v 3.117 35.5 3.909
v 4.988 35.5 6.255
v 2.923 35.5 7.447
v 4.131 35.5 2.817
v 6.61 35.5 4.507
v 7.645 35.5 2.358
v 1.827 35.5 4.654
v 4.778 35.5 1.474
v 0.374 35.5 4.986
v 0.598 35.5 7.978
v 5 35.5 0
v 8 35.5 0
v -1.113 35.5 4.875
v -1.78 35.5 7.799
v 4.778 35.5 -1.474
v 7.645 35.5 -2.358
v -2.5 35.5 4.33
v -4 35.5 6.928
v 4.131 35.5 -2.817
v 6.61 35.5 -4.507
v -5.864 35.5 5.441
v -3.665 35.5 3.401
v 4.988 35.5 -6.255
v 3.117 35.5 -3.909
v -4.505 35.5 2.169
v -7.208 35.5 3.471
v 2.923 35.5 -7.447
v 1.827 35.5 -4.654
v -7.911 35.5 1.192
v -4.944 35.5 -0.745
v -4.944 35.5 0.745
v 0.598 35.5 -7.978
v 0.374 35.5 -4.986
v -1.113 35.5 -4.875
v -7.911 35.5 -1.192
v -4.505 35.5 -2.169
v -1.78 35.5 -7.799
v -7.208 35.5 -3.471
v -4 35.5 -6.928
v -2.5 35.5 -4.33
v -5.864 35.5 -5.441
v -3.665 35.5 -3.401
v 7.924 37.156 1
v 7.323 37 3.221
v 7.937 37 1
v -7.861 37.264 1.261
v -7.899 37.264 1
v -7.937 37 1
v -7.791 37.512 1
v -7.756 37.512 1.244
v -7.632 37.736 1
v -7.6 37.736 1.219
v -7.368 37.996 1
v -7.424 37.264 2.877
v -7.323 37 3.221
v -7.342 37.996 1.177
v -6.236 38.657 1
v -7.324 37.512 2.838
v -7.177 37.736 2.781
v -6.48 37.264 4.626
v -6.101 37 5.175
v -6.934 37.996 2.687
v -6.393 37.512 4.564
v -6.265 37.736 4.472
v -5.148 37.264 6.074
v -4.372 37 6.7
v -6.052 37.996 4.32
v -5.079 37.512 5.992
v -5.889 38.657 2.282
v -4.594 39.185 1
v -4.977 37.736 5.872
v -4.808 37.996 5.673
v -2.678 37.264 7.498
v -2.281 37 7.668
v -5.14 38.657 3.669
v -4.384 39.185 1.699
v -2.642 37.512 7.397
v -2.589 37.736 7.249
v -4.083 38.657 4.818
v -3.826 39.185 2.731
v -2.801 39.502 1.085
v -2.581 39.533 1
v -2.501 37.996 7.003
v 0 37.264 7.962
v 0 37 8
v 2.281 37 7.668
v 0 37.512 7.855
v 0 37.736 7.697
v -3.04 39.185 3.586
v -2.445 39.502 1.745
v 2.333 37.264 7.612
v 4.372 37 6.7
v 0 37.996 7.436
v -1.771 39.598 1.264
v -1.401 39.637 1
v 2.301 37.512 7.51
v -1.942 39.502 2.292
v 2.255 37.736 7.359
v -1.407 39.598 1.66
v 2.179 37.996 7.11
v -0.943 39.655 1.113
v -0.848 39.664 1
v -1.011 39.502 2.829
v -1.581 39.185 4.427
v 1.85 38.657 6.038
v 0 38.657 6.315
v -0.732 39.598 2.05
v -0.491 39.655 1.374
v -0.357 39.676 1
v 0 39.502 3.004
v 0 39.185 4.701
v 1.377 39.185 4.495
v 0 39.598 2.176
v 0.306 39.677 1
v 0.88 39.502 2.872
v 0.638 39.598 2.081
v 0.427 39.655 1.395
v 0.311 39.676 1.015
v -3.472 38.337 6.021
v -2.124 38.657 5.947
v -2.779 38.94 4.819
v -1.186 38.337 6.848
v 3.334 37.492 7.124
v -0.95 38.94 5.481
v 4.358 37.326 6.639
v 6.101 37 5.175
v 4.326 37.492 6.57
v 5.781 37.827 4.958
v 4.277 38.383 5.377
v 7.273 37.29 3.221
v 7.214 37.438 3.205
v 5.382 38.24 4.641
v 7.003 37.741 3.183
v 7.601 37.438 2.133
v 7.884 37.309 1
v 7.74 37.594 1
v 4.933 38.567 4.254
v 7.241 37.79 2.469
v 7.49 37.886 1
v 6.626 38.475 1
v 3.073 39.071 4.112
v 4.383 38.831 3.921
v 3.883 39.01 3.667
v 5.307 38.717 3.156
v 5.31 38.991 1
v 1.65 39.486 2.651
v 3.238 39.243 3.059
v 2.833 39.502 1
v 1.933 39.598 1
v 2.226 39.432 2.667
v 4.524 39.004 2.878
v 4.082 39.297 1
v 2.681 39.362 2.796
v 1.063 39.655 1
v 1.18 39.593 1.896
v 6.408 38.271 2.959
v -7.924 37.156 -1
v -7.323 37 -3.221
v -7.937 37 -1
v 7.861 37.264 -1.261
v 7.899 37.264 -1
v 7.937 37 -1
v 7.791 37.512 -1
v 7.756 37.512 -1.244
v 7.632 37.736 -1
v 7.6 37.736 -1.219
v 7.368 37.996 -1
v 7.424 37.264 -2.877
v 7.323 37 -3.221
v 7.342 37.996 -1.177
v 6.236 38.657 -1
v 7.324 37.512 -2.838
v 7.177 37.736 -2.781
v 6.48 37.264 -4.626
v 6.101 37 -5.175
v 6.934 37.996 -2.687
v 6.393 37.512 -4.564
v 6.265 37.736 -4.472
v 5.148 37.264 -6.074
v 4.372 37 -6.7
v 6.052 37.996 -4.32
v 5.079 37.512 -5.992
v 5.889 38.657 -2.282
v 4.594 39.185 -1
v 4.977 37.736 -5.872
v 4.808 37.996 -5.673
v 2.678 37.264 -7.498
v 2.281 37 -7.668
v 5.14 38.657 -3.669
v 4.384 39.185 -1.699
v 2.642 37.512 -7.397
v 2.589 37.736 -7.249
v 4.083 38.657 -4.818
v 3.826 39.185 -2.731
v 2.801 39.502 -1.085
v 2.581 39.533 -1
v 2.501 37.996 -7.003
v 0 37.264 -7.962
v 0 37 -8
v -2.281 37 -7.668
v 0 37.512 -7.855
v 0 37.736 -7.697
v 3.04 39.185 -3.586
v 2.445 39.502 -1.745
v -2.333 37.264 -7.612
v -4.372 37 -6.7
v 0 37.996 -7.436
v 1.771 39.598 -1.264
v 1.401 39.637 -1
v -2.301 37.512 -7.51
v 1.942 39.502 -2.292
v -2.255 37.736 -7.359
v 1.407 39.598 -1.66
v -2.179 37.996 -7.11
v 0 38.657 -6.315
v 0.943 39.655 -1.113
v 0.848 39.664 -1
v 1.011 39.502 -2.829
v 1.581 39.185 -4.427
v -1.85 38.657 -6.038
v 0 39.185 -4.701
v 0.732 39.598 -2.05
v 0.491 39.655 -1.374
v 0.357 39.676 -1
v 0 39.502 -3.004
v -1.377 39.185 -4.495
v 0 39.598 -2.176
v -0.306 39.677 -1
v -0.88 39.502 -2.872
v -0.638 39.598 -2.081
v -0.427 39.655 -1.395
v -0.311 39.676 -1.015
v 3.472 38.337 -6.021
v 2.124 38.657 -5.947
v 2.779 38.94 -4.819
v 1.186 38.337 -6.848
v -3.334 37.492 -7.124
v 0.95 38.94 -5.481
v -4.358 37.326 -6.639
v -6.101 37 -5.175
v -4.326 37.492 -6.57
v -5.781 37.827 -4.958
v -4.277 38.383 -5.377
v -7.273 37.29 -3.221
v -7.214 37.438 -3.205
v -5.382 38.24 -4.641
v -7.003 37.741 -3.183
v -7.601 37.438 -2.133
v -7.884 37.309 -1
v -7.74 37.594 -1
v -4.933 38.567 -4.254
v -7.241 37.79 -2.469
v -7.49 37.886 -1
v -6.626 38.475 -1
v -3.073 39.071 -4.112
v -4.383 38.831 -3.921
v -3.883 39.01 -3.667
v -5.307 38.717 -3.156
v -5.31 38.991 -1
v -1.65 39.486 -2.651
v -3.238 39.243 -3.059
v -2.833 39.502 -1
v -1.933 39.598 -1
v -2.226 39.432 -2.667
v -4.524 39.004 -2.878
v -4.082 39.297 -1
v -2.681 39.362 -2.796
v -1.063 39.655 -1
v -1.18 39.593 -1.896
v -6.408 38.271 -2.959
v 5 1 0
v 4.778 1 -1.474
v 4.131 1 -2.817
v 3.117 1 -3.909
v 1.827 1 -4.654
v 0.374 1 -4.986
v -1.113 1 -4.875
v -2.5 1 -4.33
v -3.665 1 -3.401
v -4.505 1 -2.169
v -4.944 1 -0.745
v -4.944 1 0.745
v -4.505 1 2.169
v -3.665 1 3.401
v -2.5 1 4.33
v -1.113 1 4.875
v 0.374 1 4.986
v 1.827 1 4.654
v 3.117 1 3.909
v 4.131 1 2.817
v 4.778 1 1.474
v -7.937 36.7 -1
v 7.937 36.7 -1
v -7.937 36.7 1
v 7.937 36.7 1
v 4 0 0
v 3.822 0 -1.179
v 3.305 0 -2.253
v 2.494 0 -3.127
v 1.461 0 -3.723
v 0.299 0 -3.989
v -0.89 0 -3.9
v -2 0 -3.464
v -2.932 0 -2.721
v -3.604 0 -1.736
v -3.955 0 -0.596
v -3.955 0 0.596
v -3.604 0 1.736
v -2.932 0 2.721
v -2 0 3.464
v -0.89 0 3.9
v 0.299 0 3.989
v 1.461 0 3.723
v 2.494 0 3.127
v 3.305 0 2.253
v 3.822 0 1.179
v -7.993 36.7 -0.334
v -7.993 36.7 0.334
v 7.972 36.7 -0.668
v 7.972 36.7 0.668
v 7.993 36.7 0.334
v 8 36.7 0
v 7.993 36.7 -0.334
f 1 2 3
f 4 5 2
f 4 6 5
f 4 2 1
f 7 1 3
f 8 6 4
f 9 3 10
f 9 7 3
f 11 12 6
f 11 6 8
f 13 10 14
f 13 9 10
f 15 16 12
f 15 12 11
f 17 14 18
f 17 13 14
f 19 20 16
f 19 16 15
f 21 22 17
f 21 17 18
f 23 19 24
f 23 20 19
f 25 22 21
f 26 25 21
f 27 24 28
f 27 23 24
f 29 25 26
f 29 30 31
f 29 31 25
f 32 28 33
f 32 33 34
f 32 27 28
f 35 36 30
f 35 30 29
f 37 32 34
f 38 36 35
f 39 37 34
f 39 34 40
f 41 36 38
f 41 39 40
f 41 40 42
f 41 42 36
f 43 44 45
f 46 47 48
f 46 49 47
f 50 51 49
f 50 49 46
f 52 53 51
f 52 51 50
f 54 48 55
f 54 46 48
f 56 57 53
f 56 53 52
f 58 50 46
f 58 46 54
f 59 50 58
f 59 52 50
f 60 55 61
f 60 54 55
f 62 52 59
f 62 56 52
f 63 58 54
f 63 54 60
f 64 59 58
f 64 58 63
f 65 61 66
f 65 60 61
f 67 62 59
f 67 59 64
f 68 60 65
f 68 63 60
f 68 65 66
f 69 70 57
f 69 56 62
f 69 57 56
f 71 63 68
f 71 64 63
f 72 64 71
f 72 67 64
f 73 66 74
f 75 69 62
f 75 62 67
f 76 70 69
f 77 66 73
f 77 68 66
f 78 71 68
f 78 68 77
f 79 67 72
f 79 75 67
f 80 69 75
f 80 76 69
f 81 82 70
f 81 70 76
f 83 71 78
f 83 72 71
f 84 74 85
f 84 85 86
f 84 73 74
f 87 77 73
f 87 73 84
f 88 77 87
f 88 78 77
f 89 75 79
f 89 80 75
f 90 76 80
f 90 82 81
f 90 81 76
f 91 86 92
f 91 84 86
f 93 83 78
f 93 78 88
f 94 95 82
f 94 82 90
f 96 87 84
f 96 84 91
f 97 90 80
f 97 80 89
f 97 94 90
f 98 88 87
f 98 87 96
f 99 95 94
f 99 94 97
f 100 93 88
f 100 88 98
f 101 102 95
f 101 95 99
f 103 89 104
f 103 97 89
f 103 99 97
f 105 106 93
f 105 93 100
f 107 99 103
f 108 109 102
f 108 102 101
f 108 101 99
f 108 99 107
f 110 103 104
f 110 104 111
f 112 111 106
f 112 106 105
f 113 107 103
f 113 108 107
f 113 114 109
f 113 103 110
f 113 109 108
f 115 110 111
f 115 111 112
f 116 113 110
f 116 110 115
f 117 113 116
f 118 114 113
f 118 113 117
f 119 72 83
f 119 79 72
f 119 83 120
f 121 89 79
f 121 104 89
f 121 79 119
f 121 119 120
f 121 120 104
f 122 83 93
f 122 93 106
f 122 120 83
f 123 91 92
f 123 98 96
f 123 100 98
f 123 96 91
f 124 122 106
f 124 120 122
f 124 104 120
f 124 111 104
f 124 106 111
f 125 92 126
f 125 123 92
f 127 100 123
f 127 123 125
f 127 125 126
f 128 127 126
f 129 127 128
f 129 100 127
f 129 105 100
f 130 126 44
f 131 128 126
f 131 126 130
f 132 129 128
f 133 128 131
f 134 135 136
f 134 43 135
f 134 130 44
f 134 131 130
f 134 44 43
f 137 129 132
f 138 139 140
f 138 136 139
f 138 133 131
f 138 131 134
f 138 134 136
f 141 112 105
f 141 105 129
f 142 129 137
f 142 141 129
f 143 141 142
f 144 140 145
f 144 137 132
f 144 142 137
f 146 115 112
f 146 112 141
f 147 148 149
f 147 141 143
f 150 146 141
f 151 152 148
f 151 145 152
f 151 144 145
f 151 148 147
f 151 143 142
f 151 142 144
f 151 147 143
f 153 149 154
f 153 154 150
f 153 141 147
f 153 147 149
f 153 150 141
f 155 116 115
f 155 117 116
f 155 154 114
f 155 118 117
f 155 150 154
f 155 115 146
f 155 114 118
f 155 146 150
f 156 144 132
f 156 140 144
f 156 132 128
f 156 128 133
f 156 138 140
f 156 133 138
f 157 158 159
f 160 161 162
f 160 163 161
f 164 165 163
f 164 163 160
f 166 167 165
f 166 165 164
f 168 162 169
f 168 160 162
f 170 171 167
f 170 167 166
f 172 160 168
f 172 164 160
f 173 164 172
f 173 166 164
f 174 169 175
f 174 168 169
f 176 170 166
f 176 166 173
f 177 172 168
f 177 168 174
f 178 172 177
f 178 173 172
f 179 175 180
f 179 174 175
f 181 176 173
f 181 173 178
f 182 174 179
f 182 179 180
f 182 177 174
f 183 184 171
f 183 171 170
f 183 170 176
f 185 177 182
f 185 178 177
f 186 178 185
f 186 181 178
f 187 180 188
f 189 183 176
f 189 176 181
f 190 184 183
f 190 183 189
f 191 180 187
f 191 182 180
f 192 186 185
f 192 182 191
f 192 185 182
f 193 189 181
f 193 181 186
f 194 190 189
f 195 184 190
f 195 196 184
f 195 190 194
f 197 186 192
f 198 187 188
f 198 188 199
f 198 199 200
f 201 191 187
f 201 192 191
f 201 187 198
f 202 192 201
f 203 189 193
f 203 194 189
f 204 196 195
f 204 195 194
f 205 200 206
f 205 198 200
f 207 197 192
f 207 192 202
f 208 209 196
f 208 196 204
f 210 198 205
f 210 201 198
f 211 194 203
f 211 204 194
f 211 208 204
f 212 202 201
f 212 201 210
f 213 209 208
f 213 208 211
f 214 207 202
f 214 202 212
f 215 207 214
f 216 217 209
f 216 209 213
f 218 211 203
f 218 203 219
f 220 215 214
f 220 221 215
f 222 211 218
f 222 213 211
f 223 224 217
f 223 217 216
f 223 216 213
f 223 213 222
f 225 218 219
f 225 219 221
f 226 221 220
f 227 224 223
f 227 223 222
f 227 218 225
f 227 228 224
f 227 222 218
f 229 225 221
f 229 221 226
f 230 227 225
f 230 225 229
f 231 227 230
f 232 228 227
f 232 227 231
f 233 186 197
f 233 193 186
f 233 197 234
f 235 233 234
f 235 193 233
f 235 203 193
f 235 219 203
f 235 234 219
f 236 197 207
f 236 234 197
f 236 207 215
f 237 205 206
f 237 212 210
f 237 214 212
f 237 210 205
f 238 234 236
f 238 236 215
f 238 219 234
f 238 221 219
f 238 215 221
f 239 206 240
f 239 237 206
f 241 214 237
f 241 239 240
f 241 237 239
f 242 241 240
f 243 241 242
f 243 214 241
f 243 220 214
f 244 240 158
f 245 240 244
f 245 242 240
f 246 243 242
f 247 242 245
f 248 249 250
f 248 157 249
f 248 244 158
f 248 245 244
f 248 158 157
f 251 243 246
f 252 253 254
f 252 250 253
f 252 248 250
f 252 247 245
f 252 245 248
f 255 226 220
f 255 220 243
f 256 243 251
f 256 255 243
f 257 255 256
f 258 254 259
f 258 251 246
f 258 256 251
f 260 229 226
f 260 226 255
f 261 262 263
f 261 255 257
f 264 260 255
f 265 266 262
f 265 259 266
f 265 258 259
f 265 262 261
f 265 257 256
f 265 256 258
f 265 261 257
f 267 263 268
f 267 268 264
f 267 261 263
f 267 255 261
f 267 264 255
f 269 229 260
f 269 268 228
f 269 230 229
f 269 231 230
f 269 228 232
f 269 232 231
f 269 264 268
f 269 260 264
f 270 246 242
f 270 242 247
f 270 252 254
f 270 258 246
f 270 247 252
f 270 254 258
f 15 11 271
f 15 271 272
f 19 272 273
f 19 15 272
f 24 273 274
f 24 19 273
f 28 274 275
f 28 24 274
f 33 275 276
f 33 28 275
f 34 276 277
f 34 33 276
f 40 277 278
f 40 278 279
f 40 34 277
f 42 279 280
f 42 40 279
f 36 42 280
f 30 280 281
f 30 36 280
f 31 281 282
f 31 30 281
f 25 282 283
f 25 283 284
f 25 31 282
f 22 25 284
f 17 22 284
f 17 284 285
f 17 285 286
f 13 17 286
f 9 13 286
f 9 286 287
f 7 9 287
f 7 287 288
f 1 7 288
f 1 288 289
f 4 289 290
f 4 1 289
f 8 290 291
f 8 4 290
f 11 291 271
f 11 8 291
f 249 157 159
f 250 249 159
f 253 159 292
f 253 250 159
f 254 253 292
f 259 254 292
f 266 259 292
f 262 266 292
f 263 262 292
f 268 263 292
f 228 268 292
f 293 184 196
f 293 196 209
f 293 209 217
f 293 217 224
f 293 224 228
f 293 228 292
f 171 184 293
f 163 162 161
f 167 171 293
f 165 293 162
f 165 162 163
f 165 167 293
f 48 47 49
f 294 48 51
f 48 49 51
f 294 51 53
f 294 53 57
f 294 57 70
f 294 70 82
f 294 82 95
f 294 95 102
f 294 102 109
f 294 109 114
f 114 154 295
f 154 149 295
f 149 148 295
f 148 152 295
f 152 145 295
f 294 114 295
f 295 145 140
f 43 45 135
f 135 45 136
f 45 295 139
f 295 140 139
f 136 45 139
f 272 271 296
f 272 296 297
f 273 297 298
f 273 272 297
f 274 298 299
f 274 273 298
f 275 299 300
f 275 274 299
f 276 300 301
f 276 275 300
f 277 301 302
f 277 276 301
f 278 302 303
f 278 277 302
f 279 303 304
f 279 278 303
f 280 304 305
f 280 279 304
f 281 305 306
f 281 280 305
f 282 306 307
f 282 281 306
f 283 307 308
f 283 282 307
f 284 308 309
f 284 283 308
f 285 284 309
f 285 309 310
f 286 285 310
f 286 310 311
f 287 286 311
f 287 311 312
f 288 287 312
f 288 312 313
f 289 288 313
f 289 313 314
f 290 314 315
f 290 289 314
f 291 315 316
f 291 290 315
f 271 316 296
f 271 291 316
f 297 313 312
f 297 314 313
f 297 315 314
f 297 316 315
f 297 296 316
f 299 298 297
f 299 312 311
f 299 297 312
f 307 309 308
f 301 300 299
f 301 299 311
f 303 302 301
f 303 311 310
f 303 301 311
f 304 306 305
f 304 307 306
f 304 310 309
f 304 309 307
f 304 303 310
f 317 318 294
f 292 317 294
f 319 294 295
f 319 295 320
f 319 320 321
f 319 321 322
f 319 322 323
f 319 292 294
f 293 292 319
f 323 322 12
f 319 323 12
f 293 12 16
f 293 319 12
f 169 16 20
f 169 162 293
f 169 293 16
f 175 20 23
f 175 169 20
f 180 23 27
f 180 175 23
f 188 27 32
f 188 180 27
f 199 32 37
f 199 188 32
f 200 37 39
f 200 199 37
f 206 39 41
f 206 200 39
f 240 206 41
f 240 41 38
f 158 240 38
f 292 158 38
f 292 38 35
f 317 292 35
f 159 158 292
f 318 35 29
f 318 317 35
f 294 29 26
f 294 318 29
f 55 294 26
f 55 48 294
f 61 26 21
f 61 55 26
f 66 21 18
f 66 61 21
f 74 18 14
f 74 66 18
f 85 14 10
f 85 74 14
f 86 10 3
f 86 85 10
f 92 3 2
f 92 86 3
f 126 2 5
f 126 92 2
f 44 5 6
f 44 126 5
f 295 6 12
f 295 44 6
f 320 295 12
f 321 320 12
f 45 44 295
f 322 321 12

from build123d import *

# Parameters (mm, degrees)
SFAZOWANIE1_SIZE           = 1
SZKIC14_W                  = 16
SZKIC14_H                  = 2
WYTNIJ_WYCI_GNI_CIE1_DEPTH = 3


with BuildPart() as part:
    # Szkic1 → Obrót1 (revolve)
    with BuildSketch(Plane.XY):
        with BuildLine():
            Line((0, 0), (5, 0))
            Line((5, 0), (5, 35.5))
            Line((5, 35.5), (8, 35.5))
            Line((8, 35.5), (8, 37))
            add(Edge.make_bspline(
                [(8, 37), (8, 39.7), (0, 39.7)],
                knots=[0, 0, 0, 1.570796327, 1.570796327, 1.570796327], degree=2, weights=[1, 0.707106781, 1]))
            Line((0, 39.7), (0, 0))
        make_face()
    revolve(axis=Axis((0, 0, 0), (0, 1, 0)))

    # Sfazowanie1
    sfazowanie1_edges = [part.edges().sort_by_distance(p)[0] for p in [
        (-5, 0, 0),
    ]]
    chamfer(sfazowanie1_edges, length=SFAZOWANIE1_SIZE)

    # Szkic14 → Wytnij-wyciągnięcie1 (cut)
    with BuildSketch(Plane(origin=(0, 39.7, 0), x_dir=(1, 0, 0), z_dir=(0, 1, 0))):
        Rectangle(SZKIC14_W, SZKIC14_H)
    extrude(amount=-WYTNIJ_WYCI_GNI_CIE1_DEPTH, mode=Mode.SUBTRACT)


solid = part.part
